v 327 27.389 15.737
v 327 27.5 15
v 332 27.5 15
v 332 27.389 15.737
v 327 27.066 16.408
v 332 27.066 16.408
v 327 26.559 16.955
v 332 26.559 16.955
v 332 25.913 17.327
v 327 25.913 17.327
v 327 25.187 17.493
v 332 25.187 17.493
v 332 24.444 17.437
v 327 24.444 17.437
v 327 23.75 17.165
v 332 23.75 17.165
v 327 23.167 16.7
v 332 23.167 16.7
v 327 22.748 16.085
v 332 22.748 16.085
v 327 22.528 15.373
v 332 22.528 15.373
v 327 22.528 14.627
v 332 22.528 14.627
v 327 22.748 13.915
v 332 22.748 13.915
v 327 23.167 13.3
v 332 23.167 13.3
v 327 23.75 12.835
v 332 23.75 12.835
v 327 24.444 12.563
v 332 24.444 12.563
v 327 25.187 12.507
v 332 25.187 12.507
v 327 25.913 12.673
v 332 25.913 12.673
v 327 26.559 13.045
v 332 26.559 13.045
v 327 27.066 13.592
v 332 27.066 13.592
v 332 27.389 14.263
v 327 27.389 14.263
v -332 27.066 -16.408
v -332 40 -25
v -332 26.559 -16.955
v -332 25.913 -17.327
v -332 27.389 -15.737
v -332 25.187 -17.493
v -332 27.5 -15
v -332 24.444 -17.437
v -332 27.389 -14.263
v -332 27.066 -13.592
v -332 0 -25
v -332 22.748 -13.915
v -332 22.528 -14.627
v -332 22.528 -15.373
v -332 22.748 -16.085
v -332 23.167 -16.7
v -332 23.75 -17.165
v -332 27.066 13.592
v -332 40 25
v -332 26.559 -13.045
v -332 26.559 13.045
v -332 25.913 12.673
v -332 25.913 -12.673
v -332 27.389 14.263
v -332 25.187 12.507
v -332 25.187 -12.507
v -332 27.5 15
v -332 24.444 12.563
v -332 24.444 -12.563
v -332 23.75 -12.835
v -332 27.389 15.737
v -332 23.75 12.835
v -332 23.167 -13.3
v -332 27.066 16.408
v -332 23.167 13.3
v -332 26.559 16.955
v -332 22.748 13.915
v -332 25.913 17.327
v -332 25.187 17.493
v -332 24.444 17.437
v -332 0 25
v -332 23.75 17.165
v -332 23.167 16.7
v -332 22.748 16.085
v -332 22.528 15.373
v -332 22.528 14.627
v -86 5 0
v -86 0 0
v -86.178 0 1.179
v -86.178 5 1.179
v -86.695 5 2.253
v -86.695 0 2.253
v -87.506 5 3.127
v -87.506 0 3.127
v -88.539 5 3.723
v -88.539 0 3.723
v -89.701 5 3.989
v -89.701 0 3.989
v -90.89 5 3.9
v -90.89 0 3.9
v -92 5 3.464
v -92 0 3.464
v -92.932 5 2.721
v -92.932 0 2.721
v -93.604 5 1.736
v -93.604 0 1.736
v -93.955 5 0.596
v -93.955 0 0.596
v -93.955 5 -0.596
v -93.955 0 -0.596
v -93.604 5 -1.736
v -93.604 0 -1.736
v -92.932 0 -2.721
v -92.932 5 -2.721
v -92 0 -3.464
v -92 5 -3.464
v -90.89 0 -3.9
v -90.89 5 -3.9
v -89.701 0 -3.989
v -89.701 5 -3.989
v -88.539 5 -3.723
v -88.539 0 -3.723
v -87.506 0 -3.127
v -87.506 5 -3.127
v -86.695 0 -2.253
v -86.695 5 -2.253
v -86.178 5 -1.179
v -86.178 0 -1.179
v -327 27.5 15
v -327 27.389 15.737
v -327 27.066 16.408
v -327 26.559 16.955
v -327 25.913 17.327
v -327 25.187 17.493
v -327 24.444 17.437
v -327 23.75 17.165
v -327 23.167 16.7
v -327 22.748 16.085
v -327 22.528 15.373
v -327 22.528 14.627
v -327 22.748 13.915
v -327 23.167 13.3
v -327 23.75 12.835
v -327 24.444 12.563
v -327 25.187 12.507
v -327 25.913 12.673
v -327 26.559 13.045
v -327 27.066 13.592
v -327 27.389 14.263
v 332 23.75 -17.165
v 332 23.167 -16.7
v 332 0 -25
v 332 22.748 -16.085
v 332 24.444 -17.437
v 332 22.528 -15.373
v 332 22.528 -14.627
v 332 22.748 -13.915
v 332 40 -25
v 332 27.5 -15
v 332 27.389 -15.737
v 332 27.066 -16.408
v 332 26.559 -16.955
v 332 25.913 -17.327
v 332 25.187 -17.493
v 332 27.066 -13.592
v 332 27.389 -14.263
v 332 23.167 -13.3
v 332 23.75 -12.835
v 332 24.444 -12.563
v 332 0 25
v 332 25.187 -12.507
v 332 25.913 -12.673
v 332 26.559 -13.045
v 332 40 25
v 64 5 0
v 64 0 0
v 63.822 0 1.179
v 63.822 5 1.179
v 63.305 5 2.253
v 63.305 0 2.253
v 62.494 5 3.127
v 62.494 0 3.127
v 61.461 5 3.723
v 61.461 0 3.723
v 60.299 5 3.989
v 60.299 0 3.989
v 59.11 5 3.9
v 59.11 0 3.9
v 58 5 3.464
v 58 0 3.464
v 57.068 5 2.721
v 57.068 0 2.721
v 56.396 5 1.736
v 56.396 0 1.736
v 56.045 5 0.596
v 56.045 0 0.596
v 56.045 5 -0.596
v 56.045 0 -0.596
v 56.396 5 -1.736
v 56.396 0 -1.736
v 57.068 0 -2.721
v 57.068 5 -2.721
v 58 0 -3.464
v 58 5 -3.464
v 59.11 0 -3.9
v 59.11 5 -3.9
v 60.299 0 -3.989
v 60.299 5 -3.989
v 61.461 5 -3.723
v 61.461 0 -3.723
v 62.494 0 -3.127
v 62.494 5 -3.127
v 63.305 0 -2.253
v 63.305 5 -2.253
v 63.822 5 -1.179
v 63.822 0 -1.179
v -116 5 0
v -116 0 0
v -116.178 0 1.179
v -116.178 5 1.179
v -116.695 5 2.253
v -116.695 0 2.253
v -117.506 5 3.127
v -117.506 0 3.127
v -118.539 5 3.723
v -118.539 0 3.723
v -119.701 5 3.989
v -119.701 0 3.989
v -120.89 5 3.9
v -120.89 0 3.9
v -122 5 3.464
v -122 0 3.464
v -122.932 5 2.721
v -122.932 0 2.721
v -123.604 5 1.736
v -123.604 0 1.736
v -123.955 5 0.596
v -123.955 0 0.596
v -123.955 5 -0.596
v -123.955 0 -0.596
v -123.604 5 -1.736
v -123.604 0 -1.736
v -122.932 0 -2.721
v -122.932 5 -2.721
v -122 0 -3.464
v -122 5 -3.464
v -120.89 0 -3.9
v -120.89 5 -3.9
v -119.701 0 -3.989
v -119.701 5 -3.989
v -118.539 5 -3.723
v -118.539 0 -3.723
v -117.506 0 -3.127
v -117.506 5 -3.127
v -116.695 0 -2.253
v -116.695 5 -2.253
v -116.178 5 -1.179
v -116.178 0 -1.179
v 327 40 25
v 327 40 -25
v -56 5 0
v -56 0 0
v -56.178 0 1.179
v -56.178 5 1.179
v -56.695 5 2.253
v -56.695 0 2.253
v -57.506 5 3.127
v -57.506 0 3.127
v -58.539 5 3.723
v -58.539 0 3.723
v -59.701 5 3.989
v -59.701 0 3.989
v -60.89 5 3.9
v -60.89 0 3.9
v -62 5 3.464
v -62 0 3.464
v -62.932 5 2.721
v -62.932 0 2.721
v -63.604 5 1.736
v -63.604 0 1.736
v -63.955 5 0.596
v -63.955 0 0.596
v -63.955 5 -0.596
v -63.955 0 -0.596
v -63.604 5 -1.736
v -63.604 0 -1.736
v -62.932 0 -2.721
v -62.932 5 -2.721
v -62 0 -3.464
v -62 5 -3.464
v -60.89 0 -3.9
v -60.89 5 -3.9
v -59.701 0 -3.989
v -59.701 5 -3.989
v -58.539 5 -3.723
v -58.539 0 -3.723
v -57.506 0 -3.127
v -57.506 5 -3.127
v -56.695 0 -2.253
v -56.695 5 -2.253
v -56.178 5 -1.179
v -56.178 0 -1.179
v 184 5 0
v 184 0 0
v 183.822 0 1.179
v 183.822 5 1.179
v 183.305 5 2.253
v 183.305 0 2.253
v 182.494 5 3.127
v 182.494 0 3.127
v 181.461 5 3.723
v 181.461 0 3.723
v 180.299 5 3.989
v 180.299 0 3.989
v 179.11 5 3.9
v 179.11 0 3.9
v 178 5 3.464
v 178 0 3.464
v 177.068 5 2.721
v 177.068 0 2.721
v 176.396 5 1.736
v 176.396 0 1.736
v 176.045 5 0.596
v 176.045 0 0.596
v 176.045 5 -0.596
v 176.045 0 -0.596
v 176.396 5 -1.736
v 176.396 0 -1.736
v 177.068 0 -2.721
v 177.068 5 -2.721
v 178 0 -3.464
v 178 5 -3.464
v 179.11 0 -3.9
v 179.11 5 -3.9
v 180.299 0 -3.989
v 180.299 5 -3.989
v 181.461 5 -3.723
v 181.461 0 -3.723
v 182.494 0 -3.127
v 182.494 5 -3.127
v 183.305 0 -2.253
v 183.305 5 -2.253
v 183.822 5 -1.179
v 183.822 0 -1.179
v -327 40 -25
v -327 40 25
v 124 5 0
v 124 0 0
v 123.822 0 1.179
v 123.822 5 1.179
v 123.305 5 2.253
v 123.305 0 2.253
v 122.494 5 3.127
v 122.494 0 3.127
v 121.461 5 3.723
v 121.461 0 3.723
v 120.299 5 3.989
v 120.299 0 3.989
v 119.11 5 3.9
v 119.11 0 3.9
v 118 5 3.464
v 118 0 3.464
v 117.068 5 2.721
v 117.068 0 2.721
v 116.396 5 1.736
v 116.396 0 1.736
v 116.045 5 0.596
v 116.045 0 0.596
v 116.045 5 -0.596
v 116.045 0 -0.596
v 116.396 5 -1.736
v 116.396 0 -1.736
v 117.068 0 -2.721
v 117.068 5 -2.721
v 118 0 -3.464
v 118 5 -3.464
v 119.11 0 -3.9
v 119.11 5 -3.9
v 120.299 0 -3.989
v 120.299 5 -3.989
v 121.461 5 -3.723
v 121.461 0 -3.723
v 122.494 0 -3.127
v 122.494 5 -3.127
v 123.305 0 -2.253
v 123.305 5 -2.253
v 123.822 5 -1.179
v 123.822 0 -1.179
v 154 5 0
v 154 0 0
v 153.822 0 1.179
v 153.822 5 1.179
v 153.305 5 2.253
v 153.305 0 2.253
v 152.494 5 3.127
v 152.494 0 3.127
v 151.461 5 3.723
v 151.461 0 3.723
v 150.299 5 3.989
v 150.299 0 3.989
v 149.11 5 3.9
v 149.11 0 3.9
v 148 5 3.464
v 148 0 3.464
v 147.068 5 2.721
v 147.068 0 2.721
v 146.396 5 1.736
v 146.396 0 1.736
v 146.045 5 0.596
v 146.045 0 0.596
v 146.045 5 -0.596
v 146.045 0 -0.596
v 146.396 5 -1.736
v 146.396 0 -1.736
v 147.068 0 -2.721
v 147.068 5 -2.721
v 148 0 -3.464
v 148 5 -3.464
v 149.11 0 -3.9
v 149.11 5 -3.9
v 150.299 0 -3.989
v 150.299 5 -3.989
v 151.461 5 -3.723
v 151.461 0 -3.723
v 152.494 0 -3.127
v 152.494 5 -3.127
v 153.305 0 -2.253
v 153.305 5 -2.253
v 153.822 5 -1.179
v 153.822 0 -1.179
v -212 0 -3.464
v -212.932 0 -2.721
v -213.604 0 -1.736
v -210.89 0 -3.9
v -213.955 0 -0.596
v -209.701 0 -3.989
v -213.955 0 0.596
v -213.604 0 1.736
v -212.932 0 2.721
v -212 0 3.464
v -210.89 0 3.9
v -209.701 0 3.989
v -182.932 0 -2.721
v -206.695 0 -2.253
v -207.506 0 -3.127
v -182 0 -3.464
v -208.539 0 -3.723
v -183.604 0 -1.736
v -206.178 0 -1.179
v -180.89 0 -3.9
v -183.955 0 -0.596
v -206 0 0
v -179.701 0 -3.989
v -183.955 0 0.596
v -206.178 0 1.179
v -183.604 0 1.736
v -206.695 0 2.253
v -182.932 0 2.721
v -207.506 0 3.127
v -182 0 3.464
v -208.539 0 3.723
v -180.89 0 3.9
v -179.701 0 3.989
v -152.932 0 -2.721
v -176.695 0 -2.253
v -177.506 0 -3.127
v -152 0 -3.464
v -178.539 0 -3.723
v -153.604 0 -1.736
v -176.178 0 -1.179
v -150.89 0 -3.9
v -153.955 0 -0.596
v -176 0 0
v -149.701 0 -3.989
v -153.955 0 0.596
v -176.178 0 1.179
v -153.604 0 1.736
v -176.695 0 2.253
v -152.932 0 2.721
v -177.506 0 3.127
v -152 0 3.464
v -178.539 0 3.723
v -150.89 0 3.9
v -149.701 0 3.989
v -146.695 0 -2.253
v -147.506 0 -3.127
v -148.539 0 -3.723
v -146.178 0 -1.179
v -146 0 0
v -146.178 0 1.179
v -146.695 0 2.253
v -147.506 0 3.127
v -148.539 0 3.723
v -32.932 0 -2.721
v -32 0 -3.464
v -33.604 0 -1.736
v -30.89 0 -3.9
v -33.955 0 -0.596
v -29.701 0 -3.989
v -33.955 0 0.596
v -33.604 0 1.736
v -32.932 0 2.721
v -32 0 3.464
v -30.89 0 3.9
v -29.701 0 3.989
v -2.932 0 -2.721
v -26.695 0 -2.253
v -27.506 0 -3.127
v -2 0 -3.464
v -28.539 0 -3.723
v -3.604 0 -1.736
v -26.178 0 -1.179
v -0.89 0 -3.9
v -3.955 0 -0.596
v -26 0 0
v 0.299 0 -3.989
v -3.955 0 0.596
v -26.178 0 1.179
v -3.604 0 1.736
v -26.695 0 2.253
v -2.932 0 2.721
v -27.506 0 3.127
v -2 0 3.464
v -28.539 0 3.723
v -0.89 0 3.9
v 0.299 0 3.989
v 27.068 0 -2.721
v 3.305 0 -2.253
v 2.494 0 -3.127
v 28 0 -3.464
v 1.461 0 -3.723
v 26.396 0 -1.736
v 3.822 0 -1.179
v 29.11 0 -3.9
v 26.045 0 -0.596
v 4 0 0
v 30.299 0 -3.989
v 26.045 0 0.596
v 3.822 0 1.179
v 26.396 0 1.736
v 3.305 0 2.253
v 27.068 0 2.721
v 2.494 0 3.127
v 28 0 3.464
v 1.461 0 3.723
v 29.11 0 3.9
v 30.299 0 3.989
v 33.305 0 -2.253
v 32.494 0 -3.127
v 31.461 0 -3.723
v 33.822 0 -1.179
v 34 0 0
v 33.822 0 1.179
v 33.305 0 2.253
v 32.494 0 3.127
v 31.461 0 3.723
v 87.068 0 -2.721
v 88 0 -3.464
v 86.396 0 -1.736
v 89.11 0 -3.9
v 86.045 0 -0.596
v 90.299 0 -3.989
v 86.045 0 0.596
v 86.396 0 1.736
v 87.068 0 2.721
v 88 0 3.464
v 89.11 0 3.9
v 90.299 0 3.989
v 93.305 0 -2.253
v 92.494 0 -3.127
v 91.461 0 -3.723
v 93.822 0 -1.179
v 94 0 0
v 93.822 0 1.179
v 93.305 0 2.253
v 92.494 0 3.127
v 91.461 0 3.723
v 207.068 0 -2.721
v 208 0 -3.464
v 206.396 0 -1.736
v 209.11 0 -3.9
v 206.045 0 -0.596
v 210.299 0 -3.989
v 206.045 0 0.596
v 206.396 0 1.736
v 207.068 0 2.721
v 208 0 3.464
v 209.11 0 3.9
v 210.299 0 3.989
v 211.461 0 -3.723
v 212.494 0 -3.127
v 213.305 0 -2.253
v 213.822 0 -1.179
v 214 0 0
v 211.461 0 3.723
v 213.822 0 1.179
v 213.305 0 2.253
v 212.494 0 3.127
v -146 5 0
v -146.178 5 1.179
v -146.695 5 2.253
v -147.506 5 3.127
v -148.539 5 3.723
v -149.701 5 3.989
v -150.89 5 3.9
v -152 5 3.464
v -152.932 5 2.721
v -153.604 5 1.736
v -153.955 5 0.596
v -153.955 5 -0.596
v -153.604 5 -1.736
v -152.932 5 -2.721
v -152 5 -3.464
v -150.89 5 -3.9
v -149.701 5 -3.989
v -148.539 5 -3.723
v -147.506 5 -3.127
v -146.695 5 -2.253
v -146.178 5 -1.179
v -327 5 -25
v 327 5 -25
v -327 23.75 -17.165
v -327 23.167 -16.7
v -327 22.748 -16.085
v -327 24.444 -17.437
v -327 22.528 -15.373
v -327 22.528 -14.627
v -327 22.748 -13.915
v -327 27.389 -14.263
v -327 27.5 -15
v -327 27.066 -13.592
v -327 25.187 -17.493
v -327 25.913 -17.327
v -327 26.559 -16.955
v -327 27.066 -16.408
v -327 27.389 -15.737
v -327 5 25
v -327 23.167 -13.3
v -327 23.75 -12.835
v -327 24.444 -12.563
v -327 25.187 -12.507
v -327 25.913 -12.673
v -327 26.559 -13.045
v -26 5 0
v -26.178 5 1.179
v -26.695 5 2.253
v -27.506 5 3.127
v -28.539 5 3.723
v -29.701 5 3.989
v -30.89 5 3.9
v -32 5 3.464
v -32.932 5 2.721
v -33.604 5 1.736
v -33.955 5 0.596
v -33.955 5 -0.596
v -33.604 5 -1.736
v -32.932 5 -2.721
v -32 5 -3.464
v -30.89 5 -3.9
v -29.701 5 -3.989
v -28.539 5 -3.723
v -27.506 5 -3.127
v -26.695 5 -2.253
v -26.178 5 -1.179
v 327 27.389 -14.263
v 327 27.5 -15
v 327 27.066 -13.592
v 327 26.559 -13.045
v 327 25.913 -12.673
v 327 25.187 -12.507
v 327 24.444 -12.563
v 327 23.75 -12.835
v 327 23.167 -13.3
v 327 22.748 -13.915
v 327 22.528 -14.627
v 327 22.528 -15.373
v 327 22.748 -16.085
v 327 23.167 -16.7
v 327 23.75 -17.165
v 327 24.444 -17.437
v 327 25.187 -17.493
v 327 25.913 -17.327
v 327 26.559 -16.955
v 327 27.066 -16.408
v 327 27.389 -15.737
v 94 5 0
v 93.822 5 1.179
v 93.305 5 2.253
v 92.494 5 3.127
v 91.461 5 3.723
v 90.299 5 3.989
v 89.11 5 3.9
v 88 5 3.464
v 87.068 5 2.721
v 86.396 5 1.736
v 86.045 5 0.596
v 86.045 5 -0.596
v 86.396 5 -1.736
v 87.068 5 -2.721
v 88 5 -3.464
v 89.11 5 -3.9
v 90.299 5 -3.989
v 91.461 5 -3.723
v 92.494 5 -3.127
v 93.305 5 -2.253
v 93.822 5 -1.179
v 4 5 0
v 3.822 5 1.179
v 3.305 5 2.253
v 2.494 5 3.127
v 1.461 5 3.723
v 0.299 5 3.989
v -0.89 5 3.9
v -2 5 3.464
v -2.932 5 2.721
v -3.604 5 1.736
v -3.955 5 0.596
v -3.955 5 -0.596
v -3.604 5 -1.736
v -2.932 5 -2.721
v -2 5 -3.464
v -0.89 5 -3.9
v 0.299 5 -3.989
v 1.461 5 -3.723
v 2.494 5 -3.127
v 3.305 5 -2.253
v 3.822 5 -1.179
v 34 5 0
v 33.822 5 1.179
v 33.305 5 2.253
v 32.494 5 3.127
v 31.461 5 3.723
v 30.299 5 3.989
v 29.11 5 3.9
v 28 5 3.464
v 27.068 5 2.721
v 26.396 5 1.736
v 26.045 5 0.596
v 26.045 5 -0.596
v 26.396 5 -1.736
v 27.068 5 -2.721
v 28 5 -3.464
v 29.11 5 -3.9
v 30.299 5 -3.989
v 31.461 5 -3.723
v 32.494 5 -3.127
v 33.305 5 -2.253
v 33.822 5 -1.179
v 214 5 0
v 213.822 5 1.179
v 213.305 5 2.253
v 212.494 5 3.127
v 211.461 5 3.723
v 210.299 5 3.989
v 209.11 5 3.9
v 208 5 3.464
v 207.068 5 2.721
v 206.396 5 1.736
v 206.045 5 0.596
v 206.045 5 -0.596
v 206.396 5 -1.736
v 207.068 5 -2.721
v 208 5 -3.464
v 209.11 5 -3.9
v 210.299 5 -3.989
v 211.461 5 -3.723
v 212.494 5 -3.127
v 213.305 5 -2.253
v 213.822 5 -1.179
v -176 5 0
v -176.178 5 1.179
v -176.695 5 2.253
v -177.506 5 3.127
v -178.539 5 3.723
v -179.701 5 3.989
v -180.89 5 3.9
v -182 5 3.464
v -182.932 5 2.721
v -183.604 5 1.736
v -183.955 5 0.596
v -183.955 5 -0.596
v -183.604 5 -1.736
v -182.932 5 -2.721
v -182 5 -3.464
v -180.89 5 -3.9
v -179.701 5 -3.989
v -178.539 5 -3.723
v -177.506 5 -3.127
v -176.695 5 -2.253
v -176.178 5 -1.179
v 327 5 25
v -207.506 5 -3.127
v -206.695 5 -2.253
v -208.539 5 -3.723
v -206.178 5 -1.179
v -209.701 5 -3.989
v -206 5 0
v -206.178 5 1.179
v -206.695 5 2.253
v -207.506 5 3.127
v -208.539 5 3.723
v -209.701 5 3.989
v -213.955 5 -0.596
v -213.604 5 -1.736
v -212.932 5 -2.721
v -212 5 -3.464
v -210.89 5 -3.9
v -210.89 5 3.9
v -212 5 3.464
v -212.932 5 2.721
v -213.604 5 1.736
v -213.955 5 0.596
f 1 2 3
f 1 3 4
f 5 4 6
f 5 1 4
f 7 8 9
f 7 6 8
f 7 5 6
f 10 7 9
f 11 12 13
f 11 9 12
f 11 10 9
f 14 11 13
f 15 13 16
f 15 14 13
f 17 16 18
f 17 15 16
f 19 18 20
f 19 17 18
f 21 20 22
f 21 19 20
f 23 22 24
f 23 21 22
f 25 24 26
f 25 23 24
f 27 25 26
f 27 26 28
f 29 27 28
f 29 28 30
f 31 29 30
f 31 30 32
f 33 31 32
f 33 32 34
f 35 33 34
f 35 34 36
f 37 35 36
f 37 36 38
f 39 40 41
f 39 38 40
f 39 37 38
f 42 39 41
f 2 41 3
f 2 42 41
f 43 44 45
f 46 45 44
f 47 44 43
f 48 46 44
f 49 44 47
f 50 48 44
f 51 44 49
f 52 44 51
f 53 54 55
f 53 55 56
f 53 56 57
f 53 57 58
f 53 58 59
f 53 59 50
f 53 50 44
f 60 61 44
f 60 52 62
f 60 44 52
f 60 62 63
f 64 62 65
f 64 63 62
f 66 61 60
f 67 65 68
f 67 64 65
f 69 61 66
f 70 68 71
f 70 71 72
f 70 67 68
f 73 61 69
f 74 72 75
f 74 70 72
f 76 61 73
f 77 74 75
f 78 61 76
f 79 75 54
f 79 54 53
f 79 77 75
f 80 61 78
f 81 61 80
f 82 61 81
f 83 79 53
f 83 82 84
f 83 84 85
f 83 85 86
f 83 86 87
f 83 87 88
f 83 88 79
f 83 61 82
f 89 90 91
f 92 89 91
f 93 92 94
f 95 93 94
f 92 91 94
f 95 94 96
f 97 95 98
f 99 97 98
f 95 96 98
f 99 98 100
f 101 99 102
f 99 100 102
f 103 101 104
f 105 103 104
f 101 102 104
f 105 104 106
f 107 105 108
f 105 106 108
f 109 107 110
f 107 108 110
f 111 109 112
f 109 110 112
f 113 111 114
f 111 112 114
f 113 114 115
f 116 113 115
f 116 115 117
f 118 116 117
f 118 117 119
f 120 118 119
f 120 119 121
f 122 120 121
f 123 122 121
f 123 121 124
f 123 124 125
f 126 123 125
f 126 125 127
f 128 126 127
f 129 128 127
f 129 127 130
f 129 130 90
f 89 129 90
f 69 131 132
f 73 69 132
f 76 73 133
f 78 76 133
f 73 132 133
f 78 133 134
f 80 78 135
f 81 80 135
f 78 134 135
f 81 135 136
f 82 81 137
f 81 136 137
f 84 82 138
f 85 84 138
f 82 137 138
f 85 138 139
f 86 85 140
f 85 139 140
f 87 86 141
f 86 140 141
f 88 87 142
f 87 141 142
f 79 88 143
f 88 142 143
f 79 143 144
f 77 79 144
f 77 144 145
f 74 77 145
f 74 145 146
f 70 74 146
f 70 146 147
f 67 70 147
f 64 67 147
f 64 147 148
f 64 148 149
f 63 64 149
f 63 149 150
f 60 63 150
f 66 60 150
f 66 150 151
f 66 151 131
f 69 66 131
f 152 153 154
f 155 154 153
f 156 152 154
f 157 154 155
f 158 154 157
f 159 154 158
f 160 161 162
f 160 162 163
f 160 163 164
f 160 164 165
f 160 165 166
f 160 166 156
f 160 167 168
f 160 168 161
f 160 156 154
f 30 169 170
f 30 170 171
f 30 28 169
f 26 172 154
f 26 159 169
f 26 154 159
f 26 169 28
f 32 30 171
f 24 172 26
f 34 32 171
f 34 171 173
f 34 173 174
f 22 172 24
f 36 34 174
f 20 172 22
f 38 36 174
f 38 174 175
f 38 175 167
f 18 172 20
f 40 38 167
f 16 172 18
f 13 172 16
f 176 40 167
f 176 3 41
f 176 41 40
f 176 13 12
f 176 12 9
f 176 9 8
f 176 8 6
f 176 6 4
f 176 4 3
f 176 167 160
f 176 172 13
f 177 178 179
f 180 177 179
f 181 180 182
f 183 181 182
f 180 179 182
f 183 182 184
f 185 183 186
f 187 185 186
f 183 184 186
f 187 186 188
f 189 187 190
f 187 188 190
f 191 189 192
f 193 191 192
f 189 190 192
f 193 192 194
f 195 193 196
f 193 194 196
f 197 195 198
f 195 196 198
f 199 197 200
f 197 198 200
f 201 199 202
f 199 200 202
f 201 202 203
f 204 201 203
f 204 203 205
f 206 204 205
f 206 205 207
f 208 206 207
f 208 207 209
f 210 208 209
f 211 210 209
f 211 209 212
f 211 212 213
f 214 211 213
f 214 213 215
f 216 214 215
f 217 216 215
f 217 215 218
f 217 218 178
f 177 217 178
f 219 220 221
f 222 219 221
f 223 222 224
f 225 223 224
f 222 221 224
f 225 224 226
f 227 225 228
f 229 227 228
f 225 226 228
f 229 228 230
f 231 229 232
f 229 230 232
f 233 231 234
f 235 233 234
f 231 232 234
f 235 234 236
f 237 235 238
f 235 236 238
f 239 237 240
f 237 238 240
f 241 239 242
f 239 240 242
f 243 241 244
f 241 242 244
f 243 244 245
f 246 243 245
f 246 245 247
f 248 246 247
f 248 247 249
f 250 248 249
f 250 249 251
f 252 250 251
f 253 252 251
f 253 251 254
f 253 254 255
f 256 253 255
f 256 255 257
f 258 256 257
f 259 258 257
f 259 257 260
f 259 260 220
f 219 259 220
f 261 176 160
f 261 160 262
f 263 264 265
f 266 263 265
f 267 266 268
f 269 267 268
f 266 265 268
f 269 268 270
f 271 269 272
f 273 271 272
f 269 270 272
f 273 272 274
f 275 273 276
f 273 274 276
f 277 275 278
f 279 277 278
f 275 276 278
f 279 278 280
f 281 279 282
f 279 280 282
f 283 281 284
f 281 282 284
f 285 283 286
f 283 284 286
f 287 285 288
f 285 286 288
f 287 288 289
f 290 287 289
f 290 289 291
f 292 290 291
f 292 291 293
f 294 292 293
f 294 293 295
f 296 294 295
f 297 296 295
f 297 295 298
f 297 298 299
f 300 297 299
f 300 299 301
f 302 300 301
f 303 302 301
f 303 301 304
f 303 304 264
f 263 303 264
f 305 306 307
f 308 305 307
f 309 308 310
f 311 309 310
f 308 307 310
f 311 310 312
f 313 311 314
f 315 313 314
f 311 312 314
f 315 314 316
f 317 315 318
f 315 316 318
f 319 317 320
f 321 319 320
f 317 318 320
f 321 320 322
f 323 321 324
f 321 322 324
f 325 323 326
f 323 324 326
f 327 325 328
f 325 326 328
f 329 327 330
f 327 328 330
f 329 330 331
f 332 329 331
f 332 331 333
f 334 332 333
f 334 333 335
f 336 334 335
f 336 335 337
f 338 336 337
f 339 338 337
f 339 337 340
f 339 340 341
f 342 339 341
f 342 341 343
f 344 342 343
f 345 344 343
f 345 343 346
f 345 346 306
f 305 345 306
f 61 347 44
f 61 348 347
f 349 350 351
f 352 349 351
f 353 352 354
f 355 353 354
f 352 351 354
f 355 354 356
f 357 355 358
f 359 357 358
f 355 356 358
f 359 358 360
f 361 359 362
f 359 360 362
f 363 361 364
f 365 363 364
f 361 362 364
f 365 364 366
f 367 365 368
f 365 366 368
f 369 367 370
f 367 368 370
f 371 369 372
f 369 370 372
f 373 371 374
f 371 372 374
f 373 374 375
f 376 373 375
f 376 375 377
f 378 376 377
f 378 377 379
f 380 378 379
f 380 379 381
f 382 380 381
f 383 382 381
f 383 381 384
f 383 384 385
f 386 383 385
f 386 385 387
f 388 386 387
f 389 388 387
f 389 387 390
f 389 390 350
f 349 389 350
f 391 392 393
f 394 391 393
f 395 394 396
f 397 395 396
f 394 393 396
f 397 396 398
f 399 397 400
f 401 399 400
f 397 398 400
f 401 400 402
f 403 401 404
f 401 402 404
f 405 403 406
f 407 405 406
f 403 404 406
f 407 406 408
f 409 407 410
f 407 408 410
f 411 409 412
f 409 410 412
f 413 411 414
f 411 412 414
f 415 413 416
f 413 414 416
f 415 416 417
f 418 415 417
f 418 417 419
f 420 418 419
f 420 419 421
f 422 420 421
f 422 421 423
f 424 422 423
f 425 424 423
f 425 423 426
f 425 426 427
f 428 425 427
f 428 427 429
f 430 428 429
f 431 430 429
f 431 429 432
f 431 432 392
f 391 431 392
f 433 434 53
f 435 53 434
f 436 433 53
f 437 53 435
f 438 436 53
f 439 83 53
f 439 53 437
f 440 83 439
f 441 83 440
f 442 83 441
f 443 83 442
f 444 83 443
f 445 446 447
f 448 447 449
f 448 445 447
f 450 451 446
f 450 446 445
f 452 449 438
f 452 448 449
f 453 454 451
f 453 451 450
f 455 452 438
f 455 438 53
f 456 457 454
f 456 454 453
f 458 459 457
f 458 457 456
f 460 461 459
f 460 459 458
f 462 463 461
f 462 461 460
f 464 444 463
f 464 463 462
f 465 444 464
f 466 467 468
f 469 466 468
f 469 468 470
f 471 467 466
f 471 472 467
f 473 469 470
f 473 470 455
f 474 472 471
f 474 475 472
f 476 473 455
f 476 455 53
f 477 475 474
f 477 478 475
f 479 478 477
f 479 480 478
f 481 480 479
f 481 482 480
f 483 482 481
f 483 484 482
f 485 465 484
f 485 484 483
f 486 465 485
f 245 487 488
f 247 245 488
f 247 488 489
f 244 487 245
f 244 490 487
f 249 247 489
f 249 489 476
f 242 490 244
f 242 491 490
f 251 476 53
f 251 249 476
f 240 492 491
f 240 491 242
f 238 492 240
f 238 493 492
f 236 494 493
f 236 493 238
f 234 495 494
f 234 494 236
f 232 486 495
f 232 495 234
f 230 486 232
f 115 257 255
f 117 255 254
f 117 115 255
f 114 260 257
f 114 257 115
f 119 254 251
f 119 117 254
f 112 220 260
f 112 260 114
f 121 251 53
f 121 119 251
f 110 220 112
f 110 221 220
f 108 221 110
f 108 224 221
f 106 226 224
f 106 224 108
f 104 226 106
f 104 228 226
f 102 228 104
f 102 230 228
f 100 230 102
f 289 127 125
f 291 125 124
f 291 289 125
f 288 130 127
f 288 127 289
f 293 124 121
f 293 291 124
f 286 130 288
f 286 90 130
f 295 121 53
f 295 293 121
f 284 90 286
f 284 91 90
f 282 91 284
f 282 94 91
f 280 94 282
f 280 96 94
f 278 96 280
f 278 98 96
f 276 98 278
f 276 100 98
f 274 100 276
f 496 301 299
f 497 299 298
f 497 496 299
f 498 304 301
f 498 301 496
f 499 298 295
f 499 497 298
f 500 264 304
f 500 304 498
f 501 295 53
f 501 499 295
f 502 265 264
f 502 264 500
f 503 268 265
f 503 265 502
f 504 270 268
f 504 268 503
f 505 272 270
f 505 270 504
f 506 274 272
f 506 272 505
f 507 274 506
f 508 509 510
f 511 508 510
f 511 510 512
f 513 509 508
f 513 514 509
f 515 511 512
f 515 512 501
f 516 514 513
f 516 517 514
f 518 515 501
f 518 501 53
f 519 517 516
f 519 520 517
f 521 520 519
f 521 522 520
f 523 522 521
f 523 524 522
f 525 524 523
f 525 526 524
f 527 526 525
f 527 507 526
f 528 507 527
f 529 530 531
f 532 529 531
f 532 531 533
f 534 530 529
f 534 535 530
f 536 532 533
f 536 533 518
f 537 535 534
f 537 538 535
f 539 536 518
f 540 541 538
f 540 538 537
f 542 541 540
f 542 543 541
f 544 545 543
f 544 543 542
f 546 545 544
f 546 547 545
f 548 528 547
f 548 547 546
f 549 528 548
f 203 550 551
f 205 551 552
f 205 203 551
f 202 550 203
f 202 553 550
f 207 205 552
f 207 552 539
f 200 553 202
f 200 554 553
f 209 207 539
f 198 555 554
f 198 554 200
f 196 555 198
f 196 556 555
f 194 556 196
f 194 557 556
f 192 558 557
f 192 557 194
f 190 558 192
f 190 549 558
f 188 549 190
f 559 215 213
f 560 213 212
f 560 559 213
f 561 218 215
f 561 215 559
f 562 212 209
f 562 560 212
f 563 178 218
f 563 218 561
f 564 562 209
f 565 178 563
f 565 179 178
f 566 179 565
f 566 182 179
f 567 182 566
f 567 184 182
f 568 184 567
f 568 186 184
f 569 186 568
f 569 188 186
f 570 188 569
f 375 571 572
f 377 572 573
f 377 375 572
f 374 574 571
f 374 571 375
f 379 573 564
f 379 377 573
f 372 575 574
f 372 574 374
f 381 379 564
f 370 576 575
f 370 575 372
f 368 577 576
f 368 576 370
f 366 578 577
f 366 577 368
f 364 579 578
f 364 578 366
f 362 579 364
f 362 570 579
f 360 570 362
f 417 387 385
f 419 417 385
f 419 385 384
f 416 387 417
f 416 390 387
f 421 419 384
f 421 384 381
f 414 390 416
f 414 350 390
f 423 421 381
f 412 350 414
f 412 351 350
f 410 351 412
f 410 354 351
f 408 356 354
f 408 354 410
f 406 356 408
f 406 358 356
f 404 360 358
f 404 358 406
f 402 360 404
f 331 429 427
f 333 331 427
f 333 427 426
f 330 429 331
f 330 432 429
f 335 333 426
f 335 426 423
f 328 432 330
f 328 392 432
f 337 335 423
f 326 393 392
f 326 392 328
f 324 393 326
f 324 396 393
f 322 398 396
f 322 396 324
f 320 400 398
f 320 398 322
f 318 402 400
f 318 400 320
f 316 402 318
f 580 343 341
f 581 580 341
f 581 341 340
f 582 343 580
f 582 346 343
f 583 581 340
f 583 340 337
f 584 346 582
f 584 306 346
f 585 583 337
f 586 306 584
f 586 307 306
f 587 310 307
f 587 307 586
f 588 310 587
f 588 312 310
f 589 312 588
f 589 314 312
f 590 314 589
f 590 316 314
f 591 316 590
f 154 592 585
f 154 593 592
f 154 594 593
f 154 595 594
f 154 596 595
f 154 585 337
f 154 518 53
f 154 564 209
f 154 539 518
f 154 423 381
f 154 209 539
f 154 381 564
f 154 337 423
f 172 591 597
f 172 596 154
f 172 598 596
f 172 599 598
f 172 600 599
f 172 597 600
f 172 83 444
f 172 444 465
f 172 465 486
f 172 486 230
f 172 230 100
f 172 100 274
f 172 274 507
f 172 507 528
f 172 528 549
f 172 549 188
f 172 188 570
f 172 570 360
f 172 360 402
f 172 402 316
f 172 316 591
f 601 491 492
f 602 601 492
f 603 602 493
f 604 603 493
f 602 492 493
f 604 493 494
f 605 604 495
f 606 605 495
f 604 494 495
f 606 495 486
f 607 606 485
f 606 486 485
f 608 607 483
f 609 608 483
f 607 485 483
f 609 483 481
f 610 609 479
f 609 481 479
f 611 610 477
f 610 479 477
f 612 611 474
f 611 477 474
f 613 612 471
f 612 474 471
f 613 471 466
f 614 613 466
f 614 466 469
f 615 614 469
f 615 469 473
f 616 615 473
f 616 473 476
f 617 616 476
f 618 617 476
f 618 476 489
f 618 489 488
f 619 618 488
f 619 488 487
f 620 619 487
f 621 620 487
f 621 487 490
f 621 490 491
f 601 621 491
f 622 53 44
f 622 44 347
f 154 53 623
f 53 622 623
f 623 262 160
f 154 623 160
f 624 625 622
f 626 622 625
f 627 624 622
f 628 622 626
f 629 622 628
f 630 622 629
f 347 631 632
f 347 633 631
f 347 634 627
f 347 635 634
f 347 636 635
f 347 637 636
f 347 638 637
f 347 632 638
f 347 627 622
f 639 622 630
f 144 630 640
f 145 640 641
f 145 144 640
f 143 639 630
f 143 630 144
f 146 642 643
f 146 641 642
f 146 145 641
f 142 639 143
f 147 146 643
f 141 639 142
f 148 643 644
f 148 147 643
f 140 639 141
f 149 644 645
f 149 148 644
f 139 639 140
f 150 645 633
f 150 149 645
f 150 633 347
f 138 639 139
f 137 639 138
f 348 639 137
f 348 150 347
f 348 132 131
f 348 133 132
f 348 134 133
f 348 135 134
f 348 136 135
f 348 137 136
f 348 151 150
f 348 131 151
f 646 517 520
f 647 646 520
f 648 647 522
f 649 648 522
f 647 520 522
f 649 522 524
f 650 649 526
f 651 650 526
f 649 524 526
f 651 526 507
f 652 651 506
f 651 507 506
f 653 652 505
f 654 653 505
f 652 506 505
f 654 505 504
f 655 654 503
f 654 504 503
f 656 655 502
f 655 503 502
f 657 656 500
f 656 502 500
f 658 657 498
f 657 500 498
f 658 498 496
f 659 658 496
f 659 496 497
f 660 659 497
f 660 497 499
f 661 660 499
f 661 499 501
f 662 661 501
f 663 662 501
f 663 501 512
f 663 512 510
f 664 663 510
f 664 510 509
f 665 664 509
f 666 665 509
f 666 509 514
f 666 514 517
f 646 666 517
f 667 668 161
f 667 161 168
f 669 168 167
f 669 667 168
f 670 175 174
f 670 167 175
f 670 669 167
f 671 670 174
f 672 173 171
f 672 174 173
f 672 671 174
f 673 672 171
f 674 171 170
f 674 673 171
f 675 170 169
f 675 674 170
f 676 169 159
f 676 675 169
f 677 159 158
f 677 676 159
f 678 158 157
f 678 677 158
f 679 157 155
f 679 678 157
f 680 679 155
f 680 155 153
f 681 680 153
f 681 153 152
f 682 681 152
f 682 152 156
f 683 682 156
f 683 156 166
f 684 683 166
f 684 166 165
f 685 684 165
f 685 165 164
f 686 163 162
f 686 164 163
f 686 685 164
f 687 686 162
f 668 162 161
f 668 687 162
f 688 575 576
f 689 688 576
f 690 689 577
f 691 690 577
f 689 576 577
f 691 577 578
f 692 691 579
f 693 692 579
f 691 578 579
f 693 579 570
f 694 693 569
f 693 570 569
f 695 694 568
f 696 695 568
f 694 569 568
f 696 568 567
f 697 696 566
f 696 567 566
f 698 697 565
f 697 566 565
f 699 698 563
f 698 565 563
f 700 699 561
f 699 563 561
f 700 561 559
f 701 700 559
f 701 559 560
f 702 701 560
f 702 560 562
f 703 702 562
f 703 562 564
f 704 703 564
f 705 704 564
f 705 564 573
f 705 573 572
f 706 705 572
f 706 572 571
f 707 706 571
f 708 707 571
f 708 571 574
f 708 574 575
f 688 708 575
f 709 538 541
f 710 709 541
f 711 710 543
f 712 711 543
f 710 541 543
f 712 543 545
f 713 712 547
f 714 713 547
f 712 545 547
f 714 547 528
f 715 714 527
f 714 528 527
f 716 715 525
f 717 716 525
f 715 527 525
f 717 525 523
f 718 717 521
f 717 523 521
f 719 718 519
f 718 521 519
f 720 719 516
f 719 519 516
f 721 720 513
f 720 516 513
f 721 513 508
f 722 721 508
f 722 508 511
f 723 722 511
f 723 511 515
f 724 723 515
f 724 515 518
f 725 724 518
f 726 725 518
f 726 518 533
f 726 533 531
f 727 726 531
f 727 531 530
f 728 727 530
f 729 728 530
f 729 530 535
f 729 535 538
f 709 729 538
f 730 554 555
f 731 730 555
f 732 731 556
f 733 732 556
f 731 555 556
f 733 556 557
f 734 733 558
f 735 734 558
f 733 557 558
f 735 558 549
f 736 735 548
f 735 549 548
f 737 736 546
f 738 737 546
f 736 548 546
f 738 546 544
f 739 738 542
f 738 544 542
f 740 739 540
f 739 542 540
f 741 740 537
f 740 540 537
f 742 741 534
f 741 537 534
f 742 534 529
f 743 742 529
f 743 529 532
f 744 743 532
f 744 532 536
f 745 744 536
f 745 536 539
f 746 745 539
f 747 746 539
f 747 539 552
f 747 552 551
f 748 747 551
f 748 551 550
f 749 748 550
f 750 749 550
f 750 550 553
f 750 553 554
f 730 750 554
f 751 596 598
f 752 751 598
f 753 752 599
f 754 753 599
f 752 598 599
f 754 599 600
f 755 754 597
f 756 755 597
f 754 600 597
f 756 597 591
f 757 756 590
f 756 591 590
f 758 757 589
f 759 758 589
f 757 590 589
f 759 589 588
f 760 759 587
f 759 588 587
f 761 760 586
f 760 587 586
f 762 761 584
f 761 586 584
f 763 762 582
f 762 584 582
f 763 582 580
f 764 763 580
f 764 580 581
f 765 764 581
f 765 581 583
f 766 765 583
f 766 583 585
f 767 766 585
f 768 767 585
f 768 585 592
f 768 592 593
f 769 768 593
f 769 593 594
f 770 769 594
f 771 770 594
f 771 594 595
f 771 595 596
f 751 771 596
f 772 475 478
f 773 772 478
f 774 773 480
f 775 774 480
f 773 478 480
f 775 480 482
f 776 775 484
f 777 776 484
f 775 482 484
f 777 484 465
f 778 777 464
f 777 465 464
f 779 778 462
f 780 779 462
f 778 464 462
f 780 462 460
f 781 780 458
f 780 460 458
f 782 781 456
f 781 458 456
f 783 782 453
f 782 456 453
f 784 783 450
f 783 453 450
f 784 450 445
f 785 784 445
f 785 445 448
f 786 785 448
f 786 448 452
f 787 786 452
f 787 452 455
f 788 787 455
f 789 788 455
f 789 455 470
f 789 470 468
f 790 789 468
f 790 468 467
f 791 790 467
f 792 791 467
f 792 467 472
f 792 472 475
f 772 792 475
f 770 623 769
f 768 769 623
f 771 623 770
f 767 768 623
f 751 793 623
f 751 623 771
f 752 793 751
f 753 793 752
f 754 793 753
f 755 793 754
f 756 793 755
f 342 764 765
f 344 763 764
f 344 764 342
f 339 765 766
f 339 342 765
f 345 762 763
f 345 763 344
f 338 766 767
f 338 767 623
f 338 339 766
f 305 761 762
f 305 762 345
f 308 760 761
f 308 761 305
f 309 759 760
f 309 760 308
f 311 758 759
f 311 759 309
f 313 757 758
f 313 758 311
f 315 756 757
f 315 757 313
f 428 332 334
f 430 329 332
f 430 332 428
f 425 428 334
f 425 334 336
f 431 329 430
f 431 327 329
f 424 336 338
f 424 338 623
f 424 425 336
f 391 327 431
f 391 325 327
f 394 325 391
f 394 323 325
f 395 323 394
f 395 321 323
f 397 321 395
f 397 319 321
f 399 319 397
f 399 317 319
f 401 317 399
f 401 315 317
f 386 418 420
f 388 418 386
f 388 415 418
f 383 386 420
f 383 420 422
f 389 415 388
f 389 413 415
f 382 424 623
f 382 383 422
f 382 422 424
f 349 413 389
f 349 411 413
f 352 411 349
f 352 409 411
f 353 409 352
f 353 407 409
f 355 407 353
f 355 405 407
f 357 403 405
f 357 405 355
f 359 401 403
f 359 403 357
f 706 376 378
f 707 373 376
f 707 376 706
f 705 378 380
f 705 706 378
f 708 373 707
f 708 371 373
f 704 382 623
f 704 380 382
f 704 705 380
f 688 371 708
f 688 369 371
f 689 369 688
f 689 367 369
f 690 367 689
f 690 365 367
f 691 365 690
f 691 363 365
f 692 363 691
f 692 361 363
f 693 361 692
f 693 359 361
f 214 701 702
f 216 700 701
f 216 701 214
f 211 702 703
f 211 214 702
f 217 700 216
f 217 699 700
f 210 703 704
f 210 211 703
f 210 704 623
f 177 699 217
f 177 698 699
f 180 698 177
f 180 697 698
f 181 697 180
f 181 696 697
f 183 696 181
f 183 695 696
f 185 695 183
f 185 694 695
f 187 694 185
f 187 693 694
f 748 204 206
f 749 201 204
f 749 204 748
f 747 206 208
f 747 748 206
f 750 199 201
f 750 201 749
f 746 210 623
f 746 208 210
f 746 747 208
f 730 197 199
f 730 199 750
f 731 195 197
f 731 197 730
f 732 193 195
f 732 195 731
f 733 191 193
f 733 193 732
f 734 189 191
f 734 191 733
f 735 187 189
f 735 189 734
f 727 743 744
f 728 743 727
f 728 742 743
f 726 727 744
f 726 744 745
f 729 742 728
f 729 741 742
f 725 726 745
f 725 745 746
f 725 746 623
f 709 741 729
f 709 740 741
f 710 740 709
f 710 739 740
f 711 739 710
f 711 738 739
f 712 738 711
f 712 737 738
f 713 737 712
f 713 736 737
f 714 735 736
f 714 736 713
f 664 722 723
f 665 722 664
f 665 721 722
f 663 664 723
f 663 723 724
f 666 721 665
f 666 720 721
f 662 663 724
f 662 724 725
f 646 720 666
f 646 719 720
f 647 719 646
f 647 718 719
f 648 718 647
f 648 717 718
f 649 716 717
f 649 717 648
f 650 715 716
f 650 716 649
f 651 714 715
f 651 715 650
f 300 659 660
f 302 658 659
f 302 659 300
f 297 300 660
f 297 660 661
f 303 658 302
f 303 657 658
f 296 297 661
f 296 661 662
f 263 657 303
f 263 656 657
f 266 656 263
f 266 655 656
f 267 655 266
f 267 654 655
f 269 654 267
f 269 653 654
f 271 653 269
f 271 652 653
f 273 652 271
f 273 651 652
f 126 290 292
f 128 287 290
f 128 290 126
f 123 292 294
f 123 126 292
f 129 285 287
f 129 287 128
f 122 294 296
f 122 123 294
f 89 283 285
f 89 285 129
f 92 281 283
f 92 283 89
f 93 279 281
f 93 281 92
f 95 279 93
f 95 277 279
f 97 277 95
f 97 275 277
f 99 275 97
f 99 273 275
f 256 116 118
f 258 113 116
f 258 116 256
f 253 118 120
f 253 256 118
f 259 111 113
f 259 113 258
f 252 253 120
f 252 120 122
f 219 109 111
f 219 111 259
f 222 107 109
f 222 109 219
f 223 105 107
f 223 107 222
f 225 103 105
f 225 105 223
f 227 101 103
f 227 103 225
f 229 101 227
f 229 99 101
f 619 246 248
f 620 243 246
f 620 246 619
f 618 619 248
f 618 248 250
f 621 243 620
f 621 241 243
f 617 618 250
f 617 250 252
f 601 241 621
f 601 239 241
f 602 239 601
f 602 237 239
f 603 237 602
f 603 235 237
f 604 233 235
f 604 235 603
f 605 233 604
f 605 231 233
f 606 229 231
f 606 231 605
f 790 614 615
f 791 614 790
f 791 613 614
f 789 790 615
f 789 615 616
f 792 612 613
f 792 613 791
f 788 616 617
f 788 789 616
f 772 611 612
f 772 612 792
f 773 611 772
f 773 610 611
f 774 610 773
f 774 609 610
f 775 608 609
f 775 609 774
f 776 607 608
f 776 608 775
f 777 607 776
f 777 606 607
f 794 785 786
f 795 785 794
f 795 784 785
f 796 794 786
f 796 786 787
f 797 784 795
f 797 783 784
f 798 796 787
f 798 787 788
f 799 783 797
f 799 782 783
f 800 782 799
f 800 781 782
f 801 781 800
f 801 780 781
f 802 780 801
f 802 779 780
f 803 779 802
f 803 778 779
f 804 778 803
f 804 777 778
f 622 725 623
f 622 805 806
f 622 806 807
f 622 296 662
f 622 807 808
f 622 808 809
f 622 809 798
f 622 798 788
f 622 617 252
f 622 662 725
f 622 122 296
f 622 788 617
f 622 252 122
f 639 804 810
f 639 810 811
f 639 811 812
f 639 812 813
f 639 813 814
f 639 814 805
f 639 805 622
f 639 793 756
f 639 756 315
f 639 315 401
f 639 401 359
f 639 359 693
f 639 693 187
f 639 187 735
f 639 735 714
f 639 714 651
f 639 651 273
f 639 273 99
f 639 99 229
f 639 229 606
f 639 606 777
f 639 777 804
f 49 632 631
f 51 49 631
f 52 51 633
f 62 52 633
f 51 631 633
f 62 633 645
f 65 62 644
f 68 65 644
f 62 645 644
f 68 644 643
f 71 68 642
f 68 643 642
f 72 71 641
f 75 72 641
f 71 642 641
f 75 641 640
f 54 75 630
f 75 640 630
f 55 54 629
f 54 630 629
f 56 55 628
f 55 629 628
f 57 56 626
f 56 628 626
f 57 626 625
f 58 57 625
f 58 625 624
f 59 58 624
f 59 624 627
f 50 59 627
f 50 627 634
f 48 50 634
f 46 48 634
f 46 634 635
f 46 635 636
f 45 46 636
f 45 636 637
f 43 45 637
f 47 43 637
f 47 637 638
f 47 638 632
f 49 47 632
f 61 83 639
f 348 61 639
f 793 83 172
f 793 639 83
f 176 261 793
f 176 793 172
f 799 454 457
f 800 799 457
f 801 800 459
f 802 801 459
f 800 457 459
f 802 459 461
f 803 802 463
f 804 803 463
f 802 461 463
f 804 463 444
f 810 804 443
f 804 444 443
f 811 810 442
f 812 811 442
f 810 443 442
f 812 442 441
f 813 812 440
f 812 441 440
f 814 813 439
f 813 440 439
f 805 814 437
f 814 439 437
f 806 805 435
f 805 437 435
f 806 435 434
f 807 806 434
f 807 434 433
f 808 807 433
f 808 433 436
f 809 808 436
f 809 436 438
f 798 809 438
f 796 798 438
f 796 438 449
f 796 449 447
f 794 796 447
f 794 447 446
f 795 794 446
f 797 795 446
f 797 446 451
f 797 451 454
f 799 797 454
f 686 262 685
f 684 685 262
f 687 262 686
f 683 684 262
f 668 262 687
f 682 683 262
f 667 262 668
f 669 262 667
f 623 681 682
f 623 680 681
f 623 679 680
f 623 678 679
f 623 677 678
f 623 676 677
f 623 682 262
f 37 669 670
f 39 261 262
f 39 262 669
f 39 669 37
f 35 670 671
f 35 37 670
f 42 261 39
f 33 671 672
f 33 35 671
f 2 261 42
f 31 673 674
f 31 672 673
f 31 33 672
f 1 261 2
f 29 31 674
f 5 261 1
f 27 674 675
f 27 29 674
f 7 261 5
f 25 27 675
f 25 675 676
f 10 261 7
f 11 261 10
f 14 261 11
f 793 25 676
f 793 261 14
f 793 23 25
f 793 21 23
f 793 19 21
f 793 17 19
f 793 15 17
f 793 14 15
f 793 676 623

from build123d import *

# Parameters (mm, degrees)
F1_DEPTH      = 25
F2_R          = 4
F3_DEPTH      = 25
F4_R          = 2.5
F5_DEPTH      = 332.001
F5_DEPTH_BACK = 332.001


with BuildPart() as f1:
    # F0 (on Top) → F1 (new body, symmetric)
    with BuildSketch(Plane.XY):
        Polygon((-332, 0), (0, 0), (332, 0), (332, 40), (327, 40), (327, 5), (0, 5), (-327, 5), (-327, 40), (-332, 40), align=None)
    extrude(amount=F1_DEPTH, both=True)

    # F2 (on face) → F3 (cut)
    with BuildSketch(Plane.XZ):
        Circle(F2_R)
        with Locations((30, 0)):
            Circle(F2_R)
        with Locations((60, 0)):
            Circle(F2_R)
        with Locations((90, 0)):
            Circle(F2_R)
        with Locations((120, 0)):
            Circle(F2_R)
        with Locations((150, 0)):
            Circle(F2_R)
        with Locations((180, 0)):
            Circle(F2_R)
        with Locations((210, 0)):
            Circle(F2_R)
        with Locations((-30, 0)):
            Circle(F2_R)
        with Locations((-60, 0)):
            Circle(F2_R)
        with Locations((-90, 0)):
            Circle(F2_R)
        with Locations((-120, 0)):
            Circle(F2_R)
        with Locations((-150, 0)):
            Circle(F2_R)
        with Locations((-180, 0)):
            Circle(F2_R)
        with Locations((-210, 0)):
            Circle(F2_R)
    extrude(amount=-F3_DEPTH, mode=Mode.SUBTRACT)

    # F4 (on Right) → F5 (cut, two sides)
    with BuildSketch(Plane.YZ) as f5_sk:
        with Locations((25, 15)):
            Circle(F4_R)
        with Locations((25, -15)):
            Circle(F4_R)
    extrude(amount=F5_DEPTH, mode=Mode.SUBTRACT)
    extrude(f5_sk.sketch, amount=-F5_DEPTH_BACK, mode=Mode.SUBTRACT)


solid = f1.part
